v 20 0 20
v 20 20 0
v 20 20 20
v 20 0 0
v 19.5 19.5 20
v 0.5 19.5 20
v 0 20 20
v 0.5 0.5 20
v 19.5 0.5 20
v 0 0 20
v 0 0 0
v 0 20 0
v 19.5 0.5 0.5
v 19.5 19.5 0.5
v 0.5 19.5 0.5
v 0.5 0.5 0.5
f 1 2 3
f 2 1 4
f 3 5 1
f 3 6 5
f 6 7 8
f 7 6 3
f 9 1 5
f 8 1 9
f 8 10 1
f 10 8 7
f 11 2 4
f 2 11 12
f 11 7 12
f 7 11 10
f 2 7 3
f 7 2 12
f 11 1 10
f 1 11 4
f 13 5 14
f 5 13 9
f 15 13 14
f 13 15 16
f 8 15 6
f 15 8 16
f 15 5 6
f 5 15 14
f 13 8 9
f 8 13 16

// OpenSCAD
xyz=20;
thickness=0.5;

difference() {
    cube([xyz,xyz,xyz]);
    translate([thickness,thickness,thickness])
        cube([xyz-thickness*2,xyz-thickness*2,xyz-thickness]);
}
